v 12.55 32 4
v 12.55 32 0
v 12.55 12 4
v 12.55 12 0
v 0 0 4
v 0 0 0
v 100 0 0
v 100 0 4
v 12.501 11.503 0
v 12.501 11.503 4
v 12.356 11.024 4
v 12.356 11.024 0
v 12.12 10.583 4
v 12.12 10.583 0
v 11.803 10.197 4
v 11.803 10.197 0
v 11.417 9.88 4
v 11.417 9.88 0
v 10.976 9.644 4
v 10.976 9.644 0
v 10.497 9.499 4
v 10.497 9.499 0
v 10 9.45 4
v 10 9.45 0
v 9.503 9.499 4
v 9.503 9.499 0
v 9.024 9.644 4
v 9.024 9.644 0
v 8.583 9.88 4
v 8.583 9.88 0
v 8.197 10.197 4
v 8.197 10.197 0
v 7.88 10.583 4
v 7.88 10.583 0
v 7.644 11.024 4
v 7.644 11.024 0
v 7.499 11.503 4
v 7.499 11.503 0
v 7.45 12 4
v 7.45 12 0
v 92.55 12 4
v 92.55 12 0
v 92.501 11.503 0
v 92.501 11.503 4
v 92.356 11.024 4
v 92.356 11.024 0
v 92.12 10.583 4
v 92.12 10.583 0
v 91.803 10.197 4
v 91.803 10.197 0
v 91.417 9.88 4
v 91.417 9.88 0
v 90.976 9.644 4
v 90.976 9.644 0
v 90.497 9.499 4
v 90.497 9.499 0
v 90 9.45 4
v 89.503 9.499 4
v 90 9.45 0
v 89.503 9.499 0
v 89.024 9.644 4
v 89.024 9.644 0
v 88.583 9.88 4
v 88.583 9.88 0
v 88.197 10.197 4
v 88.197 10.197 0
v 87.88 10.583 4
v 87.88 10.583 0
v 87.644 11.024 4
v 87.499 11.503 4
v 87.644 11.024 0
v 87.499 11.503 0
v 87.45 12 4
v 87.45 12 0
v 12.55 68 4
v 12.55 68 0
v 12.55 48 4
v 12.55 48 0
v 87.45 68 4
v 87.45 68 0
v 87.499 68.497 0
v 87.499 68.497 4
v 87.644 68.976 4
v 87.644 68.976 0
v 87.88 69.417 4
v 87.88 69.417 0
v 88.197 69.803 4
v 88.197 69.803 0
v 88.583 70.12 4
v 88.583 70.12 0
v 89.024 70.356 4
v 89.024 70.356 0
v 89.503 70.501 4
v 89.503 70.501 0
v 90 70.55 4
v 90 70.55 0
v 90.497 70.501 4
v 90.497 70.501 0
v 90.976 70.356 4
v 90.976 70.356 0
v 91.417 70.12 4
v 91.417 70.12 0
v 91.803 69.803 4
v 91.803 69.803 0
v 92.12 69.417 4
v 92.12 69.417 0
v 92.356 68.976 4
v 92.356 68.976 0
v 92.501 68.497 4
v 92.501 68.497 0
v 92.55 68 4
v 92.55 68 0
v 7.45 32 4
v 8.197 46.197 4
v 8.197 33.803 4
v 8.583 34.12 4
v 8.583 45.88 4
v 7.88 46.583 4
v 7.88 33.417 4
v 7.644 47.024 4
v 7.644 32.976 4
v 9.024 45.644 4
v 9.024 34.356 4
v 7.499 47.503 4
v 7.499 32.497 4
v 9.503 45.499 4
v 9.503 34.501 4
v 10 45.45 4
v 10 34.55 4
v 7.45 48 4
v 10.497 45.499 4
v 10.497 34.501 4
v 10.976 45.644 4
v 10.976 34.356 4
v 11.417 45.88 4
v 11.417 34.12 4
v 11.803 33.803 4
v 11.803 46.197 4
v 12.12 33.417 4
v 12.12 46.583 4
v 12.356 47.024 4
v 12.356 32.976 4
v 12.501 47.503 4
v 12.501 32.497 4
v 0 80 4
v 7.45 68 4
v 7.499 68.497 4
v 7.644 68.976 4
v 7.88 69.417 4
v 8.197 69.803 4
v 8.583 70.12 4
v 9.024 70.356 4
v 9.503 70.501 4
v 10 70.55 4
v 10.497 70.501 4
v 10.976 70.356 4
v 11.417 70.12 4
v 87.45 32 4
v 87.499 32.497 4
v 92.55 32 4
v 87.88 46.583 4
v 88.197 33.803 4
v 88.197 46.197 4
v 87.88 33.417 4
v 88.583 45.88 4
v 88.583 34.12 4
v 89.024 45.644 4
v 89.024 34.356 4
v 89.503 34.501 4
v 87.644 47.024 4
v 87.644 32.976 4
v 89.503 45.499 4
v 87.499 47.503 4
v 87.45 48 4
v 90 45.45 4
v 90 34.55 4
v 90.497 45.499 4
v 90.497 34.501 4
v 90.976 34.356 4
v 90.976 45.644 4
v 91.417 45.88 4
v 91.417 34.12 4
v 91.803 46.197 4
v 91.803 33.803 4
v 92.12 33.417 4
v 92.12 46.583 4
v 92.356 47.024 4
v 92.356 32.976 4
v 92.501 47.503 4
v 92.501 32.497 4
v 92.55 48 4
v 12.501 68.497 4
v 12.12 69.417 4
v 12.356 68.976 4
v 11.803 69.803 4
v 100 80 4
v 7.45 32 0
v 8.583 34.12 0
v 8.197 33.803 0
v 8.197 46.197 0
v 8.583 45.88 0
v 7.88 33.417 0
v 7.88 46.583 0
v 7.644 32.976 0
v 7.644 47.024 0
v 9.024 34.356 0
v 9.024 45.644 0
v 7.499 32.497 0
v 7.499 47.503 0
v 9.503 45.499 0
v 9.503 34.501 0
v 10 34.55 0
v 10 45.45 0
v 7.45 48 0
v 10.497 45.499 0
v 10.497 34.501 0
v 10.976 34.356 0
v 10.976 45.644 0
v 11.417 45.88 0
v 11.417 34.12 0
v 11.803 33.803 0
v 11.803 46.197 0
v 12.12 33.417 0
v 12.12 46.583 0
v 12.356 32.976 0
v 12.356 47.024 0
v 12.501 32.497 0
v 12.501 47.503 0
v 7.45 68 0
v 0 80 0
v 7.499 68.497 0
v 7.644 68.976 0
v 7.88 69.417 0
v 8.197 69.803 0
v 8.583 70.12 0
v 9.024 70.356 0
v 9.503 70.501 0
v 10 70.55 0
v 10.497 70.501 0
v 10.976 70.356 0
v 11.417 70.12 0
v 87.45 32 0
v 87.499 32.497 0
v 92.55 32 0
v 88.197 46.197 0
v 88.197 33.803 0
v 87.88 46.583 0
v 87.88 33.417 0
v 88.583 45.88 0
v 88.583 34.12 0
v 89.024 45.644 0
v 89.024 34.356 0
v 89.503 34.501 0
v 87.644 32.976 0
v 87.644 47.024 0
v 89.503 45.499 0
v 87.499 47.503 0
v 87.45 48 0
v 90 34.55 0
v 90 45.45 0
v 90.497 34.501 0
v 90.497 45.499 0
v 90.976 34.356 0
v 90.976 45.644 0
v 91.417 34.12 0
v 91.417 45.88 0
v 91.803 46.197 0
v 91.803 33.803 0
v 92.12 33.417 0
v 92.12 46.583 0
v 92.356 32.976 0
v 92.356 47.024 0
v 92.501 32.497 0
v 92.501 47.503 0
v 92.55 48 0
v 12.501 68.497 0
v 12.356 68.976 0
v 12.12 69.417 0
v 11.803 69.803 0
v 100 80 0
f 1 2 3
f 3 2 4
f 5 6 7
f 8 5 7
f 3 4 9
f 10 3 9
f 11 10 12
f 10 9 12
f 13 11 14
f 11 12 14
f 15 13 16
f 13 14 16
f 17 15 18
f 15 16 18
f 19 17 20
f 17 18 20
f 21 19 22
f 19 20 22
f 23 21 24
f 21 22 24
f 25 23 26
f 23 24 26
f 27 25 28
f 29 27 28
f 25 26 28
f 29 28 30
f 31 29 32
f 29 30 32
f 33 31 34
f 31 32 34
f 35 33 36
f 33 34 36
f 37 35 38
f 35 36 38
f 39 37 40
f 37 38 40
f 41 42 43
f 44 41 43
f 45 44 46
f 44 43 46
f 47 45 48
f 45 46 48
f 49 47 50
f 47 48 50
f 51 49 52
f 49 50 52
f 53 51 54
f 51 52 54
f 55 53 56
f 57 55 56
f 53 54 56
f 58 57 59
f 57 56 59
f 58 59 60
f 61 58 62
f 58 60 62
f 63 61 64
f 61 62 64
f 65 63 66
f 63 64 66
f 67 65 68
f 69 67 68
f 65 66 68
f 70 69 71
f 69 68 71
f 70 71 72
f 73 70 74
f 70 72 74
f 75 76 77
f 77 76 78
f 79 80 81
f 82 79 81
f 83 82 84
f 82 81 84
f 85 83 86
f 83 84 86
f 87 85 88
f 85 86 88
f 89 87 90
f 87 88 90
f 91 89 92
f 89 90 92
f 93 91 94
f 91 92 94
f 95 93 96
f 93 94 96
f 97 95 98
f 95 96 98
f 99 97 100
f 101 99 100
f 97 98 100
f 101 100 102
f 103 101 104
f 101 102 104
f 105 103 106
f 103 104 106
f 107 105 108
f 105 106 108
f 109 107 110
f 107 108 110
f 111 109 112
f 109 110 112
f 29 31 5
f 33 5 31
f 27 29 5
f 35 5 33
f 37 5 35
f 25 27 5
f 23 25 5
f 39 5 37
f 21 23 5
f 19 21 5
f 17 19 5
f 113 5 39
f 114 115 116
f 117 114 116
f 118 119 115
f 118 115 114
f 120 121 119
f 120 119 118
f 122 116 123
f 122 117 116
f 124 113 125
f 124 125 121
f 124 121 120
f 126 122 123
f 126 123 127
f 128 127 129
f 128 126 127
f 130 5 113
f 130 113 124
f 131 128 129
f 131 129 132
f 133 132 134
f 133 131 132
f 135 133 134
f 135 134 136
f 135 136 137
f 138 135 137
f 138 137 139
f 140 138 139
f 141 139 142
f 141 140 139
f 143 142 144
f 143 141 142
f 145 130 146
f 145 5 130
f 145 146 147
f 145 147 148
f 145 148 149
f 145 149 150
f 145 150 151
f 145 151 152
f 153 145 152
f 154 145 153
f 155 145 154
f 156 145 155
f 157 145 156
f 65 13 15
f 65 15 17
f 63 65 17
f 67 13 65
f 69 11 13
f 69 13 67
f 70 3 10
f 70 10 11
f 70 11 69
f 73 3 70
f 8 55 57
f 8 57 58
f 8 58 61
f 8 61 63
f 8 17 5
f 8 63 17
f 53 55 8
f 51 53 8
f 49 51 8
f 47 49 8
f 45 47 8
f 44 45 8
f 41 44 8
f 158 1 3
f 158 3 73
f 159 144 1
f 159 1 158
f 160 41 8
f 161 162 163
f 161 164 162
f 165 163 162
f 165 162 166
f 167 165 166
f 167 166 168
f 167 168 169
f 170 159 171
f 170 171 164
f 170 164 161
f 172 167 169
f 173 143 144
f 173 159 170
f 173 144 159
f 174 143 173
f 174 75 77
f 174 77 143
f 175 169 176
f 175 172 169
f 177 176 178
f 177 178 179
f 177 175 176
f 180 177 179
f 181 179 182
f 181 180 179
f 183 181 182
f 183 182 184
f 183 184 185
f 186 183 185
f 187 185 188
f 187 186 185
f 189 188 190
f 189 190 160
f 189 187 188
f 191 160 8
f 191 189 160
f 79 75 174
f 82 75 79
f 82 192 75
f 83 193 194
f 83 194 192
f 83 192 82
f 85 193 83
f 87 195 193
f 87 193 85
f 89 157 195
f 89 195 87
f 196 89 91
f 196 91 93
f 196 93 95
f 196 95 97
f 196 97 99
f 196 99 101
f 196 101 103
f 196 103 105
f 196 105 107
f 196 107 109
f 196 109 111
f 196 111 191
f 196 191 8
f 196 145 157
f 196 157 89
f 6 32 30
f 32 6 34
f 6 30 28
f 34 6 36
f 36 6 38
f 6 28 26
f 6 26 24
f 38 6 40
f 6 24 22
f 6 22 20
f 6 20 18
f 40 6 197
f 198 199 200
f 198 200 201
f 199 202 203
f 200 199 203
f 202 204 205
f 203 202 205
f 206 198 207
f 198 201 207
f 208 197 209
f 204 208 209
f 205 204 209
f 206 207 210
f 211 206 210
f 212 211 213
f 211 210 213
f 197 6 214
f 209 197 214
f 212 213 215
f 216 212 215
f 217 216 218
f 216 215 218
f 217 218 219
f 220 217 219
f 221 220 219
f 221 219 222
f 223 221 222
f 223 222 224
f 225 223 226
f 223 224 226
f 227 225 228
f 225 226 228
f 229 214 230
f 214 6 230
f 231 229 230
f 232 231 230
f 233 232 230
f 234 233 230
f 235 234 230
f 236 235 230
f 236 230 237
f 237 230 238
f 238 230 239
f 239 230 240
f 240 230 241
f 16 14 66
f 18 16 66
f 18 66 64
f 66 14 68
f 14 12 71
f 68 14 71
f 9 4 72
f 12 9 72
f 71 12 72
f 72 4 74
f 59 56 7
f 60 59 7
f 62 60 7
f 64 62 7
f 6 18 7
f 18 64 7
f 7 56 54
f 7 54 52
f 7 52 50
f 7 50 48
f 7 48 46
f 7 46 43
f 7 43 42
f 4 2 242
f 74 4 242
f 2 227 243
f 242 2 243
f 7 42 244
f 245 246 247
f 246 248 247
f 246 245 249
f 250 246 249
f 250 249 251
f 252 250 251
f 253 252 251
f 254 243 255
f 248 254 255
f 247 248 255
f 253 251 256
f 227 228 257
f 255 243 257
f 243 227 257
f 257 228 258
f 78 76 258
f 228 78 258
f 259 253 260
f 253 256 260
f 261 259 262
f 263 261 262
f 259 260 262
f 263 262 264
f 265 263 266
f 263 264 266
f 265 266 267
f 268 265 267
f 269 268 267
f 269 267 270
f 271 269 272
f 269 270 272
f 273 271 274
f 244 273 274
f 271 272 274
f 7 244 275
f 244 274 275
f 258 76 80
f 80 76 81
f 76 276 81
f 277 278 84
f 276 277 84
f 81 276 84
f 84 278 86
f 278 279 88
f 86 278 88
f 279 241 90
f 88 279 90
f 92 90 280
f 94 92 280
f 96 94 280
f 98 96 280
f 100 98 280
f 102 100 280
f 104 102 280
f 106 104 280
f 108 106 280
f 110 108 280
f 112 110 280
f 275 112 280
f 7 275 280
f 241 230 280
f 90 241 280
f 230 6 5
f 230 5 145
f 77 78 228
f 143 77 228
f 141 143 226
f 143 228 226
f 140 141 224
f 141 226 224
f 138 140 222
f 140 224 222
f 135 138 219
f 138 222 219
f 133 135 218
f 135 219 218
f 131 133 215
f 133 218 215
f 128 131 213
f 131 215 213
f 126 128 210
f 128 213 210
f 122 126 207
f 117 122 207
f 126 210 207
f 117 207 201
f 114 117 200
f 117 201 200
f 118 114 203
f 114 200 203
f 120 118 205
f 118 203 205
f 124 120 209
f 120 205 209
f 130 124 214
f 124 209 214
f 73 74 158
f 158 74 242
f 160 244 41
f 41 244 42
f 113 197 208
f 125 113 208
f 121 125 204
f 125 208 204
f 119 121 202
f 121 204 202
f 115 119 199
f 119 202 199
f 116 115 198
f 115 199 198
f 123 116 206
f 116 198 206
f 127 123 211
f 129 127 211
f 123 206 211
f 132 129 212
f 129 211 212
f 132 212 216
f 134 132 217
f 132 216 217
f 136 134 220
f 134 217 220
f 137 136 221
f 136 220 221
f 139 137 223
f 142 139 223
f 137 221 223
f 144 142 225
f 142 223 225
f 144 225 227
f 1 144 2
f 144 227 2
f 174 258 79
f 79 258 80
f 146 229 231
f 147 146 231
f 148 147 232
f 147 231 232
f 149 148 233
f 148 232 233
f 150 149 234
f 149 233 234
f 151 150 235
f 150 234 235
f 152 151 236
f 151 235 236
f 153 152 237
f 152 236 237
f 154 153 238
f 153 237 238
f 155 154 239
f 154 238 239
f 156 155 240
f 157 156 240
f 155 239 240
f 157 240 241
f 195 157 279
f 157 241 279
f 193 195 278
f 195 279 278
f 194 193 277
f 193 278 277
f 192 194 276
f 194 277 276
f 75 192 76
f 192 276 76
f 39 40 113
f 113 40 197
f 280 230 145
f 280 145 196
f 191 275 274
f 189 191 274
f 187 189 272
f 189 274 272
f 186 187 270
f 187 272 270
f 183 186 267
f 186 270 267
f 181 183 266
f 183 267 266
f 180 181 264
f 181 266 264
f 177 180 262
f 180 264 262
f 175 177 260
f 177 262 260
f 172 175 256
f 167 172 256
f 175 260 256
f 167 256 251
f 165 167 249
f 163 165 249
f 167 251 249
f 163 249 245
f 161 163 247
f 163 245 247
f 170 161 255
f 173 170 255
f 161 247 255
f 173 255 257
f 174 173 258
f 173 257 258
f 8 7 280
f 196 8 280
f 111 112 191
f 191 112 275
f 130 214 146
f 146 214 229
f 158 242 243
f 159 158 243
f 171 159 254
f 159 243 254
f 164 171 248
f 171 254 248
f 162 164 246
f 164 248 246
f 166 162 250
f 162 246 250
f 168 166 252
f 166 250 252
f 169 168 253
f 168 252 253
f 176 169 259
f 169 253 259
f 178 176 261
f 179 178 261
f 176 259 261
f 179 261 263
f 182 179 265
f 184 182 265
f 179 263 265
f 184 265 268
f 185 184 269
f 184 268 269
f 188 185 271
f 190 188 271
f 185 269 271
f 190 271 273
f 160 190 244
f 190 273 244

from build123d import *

# Parameters (mm, degrees)
SKETCH1_W           = 100
SKETCH1_H           = 80
BOSS_EXTRUDE1_DEPTH = 4


with BuildPart() as part:
    # Sketch1 → Boss-Extrude1 (new body)
    with BuildSketch(Plane.XY):
        with Locations((50, 40)):
            Rectangle(SKETCH1_W, SKETCH1_H)
        with BuildLine():
            Line((12.55, 68), (12.55, 48))
            ThreePointArc((12.55, 48), (10, 45.45), (7.45, 48))
            Line((7.45, 48), (7.45, 68))
            ThreePointArc((7.45, 68), (10, 70.55), (12.55, 68))
        make_face(mode=Mode.SUBTRACT)
        with BuildLine():
            Line((12.55, 32), (12.55, 12))
            ThreePointArc((12.55, 12), (10, 9.45), (7.45, 12))
            Line((7.45, 12), (7.45, 32))
            ThreePointArc((7.45, 32), (10, 34.55), (12.55, 32))
        make_face(mode=Mode.SUBTRACT)
        with BuildLine():
            Line((92.55, 68), (92.55, 48))
            ThreePointArc((92.55, 48), (90, 45.45), (87.45, 48))
            Line((87.45, 48), (87.45, 68))
            ThreePointArc((87.45, 68), (90, 70.55), (92.55, 68))
        make_face(mode=Mode.SUBTRACT)
        with BuildLine():
            Line((92.55, 32), (92.55, 12))
            ThreePointArc((92.55, 12), (90, 9.45), (87.45, 12))
            Line((87.45, 12), (87.45, 32))
            ThreePointArc((87.45, 32), (90, 34.55), (92.55, 32))
        make_face(mode=Mode.SUBTRACT)
    extrude(amount=BOSS_EXTRUDE1_DEPTH)


solid = part.part
